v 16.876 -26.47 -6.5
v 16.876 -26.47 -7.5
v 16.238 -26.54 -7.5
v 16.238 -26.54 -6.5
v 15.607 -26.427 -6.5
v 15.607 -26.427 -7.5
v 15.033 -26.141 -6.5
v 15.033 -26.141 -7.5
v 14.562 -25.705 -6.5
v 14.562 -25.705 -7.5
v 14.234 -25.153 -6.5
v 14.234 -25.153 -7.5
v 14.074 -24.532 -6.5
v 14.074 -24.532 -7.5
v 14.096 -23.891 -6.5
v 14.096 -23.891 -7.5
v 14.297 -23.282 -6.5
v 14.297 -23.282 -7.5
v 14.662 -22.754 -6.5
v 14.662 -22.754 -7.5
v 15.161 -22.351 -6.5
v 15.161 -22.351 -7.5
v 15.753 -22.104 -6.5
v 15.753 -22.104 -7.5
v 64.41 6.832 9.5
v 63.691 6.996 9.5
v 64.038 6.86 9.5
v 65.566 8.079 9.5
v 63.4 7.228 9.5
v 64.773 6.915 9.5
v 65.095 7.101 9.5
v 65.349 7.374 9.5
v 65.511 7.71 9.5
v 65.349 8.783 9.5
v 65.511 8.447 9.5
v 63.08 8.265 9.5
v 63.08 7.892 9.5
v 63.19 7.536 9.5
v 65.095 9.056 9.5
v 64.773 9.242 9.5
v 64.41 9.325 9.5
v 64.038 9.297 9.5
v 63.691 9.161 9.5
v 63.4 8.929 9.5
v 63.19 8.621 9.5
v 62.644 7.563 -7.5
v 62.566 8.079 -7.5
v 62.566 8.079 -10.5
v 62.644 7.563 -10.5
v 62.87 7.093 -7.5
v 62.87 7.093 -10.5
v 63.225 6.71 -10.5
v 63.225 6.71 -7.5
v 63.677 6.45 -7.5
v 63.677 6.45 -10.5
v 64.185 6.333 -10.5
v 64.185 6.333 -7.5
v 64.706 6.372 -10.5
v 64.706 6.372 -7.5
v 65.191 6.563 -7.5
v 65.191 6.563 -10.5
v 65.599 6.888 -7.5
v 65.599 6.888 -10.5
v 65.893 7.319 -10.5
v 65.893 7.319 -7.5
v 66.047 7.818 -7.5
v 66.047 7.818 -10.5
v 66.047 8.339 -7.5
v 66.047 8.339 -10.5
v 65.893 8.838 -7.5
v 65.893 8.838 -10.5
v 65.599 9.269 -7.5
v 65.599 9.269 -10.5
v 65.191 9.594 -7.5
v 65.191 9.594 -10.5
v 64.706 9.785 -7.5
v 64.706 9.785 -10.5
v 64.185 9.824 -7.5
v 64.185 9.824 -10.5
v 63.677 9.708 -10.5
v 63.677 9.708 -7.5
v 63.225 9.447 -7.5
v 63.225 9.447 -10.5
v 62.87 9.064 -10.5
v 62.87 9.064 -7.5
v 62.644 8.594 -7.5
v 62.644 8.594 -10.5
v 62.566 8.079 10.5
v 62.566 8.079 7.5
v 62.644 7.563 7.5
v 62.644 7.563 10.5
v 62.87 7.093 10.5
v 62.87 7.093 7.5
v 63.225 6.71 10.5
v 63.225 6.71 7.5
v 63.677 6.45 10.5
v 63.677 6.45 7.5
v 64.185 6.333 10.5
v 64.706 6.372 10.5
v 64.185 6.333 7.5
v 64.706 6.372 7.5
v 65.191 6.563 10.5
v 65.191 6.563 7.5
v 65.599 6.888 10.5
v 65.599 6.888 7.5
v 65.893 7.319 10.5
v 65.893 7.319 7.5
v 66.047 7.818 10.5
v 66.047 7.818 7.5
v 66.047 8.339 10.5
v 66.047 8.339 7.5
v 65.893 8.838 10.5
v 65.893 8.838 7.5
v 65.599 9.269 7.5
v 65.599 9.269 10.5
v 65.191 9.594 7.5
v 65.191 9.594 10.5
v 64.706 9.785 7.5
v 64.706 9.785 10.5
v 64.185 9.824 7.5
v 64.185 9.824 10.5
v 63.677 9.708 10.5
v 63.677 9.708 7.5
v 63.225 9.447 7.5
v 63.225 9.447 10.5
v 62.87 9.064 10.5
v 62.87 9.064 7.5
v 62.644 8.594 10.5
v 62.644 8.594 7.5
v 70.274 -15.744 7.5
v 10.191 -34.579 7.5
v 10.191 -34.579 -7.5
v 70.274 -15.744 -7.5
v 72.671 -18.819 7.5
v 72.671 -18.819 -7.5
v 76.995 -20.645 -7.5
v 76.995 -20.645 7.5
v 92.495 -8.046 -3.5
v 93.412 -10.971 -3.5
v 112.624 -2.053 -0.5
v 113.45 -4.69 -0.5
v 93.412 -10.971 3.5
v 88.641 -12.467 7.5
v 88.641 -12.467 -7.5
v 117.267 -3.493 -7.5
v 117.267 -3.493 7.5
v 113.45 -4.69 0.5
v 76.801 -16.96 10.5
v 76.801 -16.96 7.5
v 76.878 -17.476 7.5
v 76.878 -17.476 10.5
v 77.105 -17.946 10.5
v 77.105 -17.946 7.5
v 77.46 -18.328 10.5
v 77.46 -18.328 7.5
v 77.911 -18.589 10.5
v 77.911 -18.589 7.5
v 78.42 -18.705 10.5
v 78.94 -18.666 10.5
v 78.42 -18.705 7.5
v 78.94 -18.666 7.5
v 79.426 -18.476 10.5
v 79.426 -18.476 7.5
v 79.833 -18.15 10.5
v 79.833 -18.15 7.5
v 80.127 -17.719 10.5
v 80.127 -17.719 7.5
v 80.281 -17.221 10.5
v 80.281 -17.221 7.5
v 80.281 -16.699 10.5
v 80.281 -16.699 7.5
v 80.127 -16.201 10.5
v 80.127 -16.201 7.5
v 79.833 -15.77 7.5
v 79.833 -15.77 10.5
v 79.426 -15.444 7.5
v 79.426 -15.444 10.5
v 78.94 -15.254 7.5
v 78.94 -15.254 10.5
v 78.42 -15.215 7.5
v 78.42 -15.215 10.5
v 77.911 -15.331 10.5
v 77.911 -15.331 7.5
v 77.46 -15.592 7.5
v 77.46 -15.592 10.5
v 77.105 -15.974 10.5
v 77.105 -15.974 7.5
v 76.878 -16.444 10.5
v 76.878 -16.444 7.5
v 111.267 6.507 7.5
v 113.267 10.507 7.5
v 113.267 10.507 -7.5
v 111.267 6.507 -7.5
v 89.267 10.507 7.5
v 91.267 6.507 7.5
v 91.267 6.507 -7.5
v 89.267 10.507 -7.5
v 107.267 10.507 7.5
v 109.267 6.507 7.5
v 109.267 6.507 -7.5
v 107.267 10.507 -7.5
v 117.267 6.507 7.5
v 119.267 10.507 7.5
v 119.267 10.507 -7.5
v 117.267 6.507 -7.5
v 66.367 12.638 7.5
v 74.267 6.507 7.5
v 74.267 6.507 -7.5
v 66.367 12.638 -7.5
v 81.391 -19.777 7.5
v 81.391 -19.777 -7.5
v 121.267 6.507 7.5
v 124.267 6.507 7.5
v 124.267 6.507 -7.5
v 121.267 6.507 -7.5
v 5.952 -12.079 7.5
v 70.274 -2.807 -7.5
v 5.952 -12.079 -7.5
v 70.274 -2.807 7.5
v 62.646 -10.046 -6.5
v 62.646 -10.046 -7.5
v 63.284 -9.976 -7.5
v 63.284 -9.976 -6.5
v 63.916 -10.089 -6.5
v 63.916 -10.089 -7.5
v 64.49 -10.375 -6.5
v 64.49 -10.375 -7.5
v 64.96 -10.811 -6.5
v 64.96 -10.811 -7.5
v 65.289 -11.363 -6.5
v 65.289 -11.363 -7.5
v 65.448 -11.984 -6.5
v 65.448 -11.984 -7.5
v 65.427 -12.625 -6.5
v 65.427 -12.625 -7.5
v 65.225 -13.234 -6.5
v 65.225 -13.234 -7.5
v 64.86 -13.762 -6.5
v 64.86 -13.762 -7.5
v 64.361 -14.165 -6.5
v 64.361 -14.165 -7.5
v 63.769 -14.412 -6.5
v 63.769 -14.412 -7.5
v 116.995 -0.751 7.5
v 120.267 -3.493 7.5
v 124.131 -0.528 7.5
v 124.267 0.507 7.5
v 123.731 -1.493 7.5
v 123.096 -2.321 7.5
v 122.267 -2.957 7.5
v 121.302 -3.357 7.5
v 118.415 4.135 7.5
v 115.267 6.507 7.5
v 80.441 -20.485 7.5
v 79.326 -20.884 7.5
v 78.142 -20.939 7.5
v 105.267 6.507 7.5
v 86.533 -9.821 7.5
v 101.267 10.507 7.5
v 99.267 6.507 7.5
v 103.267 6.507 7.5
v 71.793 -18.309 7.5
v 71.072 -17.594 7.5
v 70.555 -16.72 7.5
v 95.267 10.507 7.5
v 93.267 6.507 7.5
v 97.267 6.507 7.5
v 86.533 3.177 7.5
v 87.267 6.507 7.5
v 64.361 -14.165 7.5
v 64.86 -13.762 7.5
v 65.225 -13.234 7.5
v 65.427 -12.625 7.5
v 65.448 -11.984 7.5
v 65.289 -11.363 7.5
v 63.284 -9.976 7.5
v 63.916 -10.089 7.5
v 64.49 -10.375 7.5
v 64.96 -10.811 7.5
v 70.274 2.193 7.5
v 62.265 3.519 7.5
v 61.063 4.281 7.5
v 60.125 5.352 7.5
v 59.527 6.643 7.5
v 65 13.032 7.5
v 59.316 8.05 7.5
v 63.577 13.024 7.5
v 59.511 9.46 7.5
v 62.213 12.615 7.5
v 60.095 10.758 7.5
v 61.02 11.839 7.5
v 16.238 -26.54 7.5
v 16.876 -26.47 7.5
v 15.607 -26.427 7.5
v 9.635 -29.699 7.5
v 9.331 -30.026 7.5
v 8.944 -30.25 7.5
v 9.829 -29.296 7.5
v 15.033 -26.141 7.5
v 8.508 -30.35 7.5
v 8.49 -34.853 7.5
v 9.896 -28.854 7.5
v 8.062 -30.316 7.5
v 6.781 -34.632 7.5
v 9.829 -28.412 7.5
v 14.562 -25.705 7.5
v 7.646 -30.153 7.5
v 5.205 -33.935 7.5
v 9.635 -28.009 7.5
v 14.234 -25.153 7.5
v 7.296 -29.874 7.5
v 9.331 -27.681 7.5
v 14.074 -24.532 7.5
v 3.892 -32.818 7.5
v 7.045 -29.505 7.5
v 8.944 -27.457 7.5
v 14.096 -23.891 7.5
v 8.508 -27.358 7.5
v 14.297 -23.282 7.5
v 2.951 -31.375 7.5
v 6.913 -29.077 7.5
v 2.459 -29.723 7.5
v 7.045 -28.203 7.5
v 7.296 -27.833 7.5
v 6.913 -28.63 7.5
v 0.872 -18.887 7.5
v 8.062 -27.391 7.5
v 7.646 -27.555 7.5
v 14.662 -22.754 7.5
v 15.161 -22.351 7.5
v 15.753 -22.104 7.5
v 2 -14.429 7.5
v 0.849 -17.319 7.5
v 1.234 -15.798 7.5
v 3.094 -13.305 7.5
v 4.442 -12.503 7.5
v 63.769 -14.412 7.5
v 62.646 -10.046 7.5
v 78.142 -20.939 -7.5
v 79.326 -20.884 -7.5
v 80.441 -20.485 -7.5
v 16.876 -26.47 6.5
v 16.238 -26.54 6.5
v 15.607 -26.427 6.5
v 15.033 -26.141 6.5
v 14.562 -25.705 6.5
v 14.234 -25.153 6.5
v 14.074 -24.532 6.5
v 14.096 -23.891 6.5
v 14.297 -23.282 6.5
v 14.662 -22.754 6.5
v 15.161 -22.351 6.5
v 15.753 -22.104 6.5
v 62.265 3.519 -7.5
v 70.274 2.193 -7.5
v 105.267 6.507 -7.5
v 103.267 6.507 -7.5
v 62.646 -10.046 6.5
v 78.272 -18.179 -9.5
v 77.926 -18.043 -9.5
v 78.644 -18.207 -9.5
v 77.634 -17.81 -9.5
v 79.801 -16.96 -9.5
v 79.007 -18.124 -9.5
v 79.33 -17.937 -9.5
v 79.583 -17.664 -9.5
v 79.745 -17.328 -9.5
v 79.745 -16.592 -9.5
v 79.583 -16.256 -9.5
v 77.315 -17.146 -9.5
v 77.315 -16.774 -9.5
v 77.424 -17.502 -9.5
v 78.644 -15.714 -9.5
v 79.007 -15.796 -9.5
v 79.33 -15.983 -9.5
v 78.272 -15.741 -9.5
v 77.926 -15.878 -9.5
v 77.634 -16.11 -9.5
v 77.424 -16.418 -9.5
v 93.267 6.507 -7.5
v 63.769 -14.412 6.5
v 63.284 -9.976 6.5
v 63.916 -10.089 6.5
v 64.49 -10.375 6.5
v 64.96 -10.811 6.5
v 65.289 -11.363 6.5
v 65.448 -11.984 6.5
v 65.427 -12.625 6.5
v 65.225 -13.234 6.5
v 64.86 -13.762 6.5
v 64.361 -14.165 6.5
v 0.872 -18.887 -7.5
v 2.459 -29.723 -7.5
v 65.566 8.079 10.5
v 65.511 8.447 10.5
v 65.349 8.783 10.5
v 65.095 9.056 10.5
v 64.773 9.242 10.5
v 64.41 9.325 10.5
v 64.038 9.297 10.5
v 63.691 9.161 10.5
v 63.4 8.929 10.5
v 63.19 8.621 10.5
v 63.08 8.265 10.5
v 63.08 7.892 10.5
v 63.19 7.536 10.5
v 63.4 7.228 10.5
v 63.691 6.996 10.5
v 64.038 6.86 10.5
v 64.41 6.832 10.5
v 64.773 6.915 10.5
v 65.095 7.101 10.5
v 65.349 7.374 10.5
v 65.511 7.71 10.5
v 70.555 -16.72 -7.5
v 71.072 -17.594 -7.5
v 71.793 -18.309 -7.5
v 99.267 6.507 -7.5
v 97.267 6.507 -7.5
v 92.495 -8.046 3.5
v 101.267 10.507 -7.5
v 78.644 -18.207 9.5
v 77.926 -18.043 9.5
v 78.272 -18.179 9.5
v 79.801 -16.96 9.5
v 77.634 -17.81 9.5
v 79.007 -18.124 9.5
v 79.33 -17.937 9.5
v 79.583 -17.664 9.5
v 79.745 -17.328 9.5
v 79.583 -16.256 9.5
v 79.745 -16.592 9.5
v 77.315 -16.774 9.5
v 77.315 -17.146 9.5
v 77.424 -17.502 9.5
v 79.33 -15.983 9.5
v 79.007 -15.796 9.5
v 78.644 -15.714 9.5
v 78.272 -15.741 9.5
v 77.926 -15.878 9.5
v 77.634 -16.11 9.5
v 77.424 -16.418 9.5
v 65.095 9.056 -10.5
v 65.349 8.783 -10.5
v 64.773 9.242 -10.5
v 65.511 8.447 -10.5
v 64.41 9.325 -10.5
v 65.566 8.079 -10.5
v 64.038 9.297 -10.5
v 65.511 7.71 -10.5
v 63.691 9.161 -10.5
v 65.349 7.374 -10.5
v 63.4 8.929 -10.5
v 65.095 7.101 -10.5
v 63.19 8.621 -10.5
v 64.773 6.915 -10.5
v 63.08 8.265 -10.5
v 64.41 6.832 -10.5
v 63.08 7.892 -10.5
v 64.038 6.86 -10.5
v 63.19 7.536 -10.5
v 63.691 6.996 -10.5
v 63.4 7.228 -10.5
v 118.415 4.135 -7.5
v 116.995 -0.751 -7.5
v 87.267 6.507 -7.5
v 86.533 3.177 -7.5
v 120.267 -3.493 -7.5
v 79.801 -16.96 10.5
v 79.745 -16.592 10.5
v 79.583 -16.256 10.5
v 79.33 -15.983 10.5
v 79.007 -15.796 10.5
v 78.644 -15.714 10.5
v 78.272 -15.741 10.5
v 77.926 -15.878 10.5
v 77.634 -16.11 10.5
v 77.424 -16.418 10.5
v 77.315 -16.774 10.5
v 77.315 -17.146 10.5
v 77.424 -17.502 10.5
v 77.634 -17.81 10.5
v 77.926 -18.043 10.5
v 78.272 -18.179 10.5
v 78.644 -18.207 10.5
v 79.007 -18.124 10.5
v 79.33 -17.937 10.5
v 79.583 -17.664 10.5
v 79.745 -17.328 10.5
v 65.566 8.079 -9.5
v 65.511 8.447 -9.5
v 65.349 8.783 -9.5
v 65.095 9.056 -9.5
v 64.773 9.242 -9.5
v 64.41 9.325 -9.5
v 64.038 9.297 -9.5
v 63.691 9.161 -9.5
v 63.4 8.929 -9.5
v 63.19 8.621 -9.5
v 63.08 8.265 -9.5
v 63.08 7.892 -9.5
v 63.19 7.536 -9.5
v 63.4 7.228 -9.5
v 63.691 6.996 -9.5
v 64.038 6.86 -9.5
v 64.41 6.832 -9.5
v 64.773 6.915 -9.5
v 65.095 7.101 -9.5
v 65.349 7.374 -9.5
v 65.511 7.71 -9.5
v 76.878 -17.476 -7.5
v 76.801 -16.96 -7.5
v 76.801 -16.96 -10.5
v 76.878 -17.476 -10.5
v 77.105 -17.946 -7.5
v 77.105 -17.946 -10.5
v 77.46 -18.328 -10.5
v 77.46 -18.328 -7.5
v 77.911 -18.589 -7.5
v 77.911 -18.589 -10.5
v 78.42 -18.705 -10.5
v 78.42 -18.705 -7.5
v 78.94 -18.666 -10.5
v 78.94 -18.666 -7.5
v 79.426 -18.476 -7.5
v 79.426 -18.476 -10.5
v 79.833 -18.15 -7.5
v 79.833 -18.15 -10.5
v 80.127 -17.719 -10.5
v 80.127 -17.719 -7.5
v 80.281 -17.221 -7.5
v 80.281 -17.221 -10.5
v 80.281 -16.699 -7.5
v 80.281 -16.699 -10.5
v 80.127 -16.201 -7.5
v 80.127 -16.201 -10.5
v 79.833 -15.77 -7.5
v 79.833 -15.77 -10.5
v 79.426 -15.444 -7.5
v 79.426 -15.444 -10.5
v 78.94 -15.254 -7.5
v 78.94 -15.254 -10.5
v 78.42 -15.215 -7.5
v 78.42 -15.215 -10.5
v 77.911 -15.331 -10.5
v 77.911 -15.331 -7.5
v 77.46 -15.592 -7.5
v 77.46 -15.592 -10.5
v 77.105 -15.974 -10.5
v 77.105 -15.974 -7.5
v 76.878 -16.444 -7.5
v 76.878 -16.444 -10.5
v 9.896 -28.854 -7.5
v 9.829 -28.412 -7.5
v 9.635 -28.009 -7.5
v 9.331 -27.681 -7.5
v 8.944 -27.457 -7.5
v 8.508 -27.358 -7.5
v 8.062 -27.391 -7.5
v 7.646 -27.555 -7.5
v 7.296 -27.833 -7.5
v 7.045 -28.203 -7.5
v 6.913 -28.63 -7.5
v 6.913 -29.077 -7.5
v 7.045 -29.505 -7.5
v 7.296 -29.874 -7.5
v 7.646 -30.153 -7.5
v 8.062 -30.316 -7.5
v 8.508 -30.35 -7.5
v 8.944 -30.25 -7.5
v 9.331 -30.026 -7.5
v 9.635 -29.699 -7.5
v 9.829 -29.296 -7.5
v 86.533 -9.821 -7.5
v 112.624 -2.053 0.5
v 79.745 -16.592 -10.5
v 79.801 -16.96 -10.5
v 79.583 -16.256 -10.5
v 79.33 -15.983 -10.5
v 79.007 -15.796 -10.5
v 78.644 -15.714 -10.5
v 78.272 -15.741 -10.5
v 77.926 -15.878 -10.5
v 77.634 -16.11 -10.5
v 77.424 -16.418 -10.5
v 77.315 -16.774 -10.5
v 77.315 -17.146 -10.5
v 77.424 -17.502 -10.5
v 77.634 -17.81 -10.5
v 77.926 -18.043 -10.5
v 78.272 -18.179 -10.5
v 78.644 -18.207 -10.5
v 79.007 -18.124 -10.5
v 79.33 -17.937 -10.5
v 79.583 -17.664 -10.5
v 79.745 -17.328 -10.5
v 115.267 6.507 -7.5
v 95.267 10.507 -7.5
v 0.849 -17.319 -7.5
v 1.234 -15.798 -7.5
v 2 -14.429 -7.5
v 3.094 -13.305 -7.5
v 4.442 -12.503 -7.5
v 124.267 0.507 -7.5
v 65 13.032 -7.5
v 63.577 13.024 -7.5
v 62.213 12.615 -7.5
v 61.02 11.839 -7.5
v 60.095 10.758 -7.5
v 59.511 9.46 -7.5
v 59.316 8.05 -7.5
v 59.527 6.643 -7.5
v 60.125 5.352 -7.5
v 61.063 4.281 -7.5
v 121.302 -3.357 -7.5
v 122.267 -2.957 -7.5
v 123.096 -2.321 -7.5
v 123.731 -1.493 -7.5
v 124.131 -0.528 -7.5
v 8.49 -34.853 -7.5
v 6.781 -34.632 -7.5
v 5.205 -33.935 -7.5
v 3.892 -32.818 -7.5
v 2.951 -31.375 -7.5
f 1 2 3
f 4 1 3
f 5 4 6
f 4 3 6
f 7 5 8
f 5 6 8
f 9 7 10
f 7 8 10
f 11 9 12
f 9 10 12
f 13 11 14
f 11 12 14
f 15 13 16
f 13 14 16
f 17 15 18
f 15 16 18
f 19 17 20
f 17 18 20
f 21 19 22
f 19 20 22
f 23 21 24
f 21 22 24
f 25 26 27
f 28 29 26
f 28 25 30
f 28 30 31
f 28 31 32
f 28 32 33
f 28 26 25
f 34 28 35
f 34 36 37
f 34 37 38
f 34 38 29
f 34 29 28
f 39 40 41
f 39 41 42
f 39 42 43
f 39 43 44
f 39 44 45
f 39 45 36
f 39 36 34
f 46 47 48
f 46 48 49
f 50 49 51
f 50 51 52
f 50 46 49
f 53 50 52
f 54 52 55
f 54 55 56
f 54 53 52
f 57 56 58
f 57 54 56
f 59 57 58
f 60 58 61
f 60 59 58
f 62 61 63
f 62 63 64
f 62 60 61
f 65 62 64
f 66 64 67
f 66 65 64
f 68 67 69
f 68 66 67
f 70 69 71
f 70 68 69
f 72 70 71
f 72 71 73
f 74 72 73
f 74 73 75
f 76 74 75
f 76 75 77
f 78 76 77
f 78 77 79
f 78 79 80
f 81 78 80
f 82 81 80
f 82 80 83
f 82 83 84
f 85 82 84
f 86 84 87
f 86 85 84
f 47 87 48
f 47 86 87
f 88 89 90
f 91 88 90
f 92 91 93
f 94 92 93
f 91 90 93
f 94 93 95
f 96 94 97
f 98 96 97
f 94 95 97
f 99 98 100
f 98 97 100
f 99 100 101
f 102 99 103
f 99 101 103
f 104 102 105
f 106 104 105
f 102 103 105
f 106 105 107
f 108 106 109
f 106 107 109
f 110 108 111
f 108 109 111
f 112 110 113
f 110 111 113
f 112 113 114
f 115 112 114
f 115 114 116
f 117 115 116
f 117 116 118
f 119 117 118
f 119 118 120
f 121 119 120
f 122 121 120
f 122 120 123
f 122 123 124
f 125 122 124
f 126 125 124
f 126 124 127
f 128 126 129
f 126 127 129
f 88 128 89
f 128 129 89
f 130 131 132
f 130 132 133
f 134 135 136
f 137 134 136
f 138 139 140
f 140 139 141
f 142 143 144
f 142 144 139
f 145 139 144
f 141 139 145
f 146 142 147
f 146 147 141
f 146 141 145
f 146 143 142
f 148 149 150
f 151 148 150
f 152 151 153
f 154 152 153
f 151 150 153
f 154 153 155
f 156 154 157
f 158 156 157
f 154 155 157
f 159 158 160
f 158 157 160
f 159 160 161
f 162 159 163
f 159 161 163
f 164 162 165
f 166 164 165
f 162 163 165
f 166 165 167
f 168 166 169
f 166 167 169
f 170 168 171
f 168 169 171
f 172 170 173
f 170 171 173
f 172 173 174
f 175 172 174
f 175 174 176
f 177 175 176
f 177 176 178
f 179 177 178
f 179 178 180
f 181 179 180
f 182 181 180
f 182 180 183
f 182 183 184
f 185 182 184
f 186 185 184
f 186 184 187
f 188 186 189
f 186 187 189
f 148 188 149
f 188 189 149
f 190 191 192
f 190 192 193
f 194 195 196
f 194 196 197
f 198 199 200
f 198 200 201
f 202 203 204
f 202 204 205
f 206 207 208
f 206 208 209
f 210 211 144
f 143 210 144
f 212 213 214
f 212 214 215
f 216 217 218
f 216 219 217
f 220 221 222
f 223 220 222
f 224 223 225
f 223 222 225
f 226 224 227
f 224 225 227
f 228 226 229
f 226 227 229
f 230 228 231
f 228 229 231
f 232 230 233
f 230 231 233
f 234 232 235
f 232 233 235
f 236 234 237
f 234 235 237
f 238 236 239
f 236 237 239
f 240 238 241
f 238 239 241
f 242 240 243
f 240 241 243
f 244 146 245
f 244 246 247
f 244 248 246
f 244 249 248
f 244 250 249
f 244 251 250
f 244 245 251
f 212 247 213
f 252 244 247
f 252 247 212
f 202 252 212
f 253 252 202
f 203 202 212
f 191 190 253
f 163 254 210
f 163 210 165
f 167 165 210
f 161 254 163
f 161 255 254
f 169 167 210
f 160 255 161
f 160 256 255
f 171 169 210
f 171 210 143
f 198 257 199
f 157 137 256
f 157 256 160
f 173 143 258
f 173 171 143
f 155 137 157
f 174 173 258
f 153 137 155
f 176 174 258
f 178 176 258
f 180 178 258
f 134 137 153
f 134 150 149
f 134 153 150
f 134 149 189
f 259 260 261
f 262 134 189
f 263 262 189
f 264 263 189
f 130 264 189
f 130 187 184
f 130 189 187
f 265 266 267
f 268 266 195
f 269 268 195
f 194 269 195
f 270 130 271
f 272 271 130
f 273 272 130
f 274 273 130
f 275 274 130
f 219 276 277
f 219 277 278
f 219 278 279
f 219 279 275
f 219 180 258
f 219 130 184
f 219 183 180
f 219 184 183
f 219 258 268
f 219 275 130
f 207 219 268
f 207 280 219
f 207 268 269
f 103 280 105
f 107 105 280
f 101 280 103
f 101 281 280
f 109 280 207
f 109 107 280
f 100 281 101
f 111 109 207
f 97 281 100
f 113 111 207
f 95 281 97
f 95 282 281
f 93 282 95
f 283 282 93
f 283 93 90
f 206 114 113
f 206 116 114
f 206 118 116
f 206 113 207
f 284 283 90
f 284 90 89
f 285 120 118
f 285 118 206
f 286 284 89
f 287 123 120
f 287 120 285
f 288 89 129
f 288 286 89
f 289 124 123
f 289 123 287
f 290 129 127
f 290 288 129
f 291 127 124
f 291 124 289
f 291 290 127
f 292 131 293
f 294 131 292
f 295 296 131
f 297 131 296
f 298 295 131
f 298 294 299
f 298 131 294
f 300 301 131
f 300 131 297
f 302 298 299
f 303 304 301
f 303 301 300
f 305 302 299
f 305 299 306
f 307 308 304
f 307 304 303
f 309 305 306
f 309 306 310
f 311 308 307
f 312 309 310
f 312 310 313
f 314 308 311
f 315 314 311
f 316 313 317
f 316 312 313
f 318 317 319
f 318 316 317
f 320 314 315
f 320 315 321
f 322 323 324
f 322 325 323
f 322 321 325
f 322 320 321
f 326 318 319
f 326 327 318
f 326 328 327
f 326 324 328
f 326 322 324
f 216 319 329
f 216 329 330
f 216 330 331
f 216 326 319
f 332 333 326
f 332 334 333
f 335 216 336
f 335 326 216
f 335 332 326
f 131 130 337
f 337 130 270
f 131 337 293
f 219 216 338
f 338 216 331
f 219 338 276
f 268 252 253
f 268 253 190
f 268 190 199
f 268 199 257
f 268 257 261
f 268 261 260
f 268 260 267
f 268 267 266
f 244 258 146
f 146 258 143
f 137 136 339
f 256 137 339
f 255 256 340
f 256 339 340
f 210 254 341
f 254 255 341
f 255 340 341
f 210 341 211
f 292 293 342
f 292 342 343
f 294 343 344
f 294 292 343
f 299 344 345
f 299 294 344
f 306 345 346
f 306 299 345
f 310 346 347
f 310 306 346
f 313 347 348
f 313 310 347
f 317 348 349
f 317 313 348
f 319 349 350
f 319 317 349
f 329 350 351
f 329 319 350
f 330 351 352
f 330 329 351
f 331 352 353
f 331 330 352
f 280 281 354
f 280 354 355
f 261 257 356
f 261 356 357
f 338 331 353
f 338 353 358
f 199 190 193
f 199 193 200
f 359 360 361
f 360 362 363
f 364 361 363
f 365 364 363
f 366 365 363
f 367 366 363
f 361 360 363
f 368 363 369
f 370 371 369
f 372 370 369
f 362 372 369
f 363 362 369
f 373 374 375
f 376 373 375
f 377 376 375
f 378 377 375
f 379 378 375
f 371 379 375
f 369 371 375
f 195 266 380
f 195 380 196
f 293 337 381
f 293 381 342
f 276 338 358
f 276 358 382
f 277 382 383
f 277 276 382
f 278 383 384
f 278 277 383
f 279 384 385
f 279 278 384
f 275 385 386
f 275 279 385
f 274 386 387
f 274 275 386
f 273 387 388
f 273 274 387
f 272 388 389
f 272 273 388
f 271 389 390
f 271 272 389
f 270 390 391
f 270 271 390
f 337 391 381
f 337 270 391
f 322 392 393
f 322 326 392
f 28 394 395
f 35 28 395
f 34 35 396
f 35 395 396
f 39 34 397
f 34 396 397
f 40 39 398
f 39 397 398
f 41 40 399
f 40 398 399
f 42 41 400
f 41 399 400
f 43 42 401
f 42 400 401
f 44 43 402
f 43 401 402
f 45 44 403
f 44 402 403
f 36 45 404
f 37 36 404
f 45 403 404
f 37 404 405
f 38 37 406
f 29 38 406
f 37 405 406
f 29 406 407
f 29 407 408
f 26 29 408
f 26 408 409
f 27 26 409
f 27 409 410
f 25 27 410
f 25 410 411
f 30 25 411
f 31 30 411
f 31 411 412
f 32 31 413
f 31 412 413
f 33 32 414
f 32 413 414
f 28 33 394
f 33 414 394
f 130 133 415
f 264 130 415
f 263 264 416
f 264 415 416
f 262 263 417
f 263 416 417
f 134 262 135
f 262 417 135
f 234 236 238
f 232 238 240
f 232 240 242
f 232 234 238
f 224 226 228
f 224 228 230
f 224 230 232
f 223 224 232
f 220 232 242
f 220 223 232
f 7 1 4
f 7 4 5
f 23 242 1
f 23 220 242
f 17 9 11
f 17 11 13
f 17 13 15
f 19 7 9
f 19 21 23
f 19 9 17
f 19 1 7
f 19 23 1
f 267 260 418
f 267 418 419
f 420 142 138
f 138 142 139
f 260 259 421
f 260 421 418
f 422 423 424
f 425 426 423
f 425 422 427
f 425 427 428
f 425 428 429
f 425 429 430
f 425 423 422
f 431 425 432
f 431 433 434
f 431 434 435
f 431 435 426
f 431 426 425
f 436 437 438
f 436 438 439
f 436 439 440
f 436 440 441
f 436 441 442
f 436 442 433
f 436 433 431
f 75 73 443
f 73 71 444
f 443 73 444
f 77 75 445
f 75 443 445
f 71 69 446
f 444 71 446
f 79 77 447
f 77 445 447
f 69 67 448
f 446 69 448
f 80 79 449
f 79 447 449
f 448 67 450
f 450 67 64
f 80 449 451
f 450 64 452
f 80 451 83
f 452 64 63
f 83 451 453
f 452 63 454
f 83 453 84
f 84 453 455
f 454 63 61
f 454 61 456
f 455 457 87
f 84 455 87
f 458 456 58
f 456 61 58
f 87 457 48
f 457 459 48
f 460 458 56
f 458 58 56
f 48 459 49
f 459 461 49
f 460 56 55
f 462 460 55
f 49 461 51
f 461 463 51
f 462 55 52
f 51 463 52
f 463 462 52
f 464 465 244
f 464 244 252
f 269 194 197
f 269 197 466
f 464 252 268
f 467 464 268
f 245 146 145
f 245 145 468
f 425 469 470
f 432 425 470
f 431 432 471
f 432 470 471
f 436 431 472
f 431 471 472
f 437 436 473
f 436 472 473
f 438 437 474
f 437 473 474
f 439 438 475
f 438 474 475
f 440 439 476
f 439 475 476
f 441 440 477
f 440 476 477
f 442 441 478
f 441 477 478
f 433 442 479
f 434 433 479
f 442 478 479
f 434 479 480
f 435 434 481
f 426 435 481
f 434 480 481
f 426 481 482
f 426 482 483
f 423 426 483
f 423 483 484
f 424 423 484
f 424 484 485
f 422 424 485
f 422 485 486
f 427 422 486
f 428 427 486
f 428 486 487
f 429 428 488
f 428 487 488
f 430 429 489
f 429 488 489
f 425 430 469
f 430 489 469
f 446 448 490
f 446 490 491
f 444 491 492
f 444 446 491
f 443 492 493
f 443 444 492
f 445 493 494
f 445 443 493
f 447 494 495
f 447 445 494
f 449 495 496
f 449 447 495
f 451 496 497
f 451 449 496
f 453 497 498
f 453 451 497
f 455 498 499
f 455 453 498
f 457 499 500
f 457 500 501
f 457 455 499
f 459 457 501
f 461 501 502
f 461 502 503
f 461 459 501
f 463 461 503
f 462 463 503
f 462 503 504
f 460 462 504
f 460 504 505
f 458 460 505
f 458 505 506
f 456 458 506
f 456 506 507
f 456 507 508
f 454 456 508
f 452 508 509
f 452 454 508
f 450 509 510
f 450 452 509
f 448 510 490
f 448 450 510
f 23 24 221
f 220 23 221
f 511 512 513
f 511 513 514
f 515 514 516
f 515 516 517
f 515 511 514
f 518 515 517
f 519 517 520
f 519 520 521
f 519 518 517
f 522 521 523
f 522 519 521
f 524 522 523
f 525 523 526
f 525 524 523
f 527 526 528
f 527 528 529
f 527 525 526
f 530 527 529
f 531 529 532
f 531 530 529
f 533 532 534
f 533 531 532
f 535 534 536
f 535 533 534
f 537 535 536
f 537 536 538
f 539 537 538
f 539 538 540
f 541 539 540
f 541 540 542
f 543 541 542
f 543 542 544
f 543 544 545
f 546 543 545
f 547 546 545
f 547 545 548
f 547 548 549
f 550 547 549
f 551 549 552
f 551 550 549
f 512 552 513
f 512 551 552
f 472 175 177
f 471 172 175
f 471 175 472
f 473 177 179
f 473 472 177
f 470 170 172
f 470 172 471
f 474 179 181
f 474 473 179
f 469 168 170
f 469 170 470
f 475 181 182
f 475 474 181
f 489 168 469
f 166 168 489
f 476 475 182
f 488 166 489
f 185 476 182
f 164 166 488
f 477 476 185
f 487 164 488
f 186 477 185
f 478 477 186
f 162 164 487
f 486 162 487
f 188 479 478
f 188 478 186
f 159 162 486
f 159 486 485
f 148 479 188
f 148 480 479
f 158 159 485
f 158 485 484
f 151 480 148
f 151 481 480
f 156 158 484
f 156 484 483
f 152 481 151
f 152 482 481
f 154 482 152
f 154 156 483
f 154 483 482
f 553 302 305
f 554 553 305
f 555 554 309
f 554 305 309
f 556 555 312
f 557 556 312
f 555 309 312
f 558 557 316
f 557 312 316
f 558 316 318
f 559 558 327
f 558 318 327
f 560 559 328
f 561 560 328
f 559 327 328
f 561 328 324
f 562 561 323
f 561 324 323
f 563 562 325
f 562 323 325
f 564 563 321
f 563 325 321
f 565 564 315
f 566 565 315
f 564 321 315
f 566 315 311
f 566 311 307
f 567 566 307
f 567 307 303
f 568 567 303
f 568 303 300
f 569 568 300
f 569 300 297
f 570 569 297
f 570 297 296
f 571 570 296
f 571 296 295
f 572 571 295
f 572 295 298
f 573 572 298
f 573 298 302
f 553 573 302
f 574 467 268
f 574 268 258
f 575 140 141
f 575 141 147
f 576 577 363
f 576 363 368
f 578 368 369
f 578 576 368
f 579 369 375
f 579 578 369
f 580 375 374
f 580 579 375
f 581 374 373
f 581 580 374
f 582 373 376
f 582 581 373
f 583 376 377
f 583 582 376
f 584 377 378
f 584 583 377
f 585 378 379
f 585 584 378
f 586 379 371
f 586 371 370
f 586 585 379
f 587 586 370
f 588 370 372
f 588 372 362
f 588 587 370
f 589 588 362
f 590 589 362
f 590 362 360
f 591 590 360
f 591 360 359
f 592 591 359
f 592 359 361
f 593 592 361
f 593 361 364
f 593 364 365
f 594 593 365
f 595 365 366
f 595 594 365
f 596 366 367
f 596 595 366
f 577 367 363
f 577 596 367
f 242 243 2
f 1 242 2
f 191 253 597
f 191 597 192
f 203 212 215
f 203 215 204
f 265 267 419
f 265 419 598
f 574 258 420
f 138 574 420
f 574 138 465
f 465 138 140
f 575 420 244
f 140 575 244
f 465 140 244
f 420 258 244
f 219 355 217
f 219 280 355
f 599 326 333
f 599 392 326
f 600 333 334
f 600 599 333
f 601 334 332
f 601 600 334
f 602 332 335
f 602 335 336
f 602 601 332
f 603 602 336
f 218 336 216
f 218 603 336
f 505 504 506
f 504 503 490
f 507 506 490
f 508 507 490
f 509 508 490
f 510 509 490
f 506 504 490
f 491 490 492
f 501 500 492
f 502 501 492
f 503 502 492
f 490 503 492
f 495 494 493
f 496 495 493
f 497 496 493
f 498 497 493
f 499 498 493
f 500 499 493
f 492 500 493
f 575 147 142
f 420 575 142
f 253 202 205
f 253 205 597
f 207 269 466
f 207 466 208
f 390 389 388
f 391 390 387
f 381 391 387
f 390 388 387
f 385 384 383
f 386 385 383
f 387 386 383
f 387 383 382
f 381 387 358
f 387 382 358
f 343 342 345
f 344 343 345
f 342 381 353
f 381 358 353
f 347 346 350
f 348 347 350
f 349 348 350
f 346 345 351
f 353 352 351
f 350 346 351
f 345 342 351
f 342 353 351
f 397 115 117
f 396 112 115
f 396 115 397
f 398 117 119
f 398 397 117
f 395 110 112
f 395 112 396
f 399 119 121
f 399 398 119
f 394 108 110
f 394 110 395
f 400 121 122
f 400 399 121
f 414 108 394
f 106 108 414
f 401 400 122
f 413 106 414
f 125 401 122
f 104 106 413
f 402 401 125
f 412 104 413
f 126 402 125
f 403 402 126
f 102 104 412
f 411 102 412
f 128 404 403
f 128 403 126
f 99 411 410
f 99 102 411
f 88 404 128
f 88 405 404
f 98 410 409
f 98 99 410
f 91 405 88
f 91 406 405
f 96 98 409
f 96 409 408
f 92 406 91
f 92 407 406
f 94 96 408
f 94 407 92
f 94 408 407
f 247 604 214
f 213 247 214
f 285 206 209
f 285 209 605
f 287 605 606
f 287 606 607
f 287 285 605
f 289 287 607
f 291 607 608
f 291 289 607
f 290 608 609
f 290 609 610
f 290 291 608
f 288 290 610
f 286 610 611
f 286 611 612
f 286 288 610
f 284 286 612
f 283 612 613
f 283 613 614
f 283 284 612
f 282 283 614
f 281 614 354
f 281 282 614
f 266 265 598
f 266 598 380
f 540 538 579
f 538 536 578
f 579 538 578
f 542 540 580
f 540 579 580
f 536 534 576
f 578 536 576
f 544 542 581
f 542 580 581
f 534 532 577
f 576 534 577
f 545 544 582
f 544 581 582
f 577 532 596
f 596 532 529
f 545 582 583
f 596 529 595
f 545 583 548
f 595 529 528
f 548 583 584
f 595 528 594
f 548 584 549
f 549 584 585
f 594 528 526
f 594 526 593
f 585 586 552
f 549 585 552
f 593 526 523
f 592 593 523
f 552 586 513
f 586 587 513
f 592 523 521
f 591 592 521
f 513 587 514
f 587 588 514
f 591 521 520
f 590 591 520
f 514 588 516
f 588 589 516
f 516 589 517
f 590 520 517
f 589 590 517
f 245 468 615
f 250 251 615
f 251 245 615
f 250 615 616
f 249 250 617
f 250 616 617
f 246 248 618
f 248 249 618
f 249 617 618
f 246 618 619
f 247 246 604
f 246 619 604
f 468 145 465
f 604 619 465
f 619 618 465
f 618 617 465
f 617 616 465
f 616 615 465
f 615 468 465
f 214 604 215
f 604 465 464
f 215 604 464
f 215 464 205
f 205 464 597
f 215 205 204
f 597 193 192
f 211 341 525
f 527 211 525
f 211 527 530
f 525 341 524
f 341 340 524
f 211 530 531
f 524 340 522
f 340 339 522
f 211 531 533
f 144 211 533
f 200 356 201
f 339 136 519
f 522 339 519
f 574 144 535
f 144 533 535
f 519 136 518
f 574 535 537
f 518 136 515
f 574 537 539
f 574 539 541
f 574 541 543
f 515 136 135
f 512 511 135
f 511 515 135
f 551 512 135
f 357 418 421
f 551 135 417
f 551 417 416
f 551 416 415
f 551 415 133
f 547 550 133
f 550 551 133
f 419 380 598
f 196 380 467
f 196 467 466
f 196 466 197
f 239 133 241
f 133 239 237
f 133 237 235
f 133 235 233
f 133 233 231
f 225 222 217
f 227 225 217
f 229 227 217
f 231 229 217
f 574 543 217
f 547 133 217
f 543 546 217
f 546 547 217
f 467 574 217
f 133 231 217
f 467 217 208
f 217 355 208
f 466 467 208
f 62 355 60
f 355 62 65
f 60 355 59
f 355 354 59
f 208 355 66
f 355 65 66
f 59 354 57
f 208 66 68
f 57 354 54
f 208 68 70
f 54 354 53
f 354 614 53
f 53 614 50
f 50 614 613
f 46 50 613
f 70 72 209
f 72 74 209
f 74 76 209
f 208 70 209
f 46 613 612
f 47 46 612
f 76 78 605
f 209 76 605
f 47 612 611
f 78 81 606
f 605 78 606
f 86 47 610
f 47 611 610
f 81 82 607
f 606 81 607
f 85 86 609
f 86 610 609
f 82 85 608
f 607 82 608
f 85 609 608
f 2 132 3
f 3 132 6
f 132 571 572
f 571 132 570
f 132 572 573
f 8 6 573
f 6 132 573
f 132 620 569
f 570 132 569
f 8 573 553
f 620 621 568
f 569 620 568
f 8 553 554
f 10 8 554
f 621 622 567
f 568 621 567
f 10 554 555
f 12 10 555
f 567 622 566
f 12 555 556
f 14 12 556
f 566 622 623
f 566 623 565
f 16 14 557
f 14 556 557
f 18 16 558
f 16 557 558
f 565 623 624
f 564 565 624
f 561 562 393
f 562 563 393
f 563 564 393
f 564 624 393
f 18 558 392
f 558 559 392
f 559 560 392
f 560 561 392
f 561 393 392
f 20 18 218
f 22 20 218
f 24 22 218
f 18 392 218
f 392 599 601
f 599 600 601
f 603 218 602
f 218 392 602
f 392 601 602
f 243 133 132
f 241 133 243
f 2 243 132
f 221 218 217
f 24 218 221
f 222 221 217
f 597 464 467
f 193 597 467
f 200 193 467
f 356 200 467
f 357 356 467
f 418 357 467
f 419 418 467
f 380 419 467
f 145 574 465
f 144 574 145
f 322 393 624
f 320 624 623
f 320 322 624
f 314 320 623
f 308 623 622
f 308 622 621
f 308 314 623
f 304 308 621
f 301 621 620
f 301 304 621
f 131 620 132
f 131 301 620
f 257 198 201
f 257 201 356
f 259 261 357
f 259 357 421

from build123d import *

# Parameters (mm, degrees)
BOSS_EXTRUDE1_DEPTH = 7.5
FILLET1_R           = 6
FILLET2_R           = 4
BOSS_EXTRUDE2_DEPTH = 15
LPATTERN1_COUNT     = 6
LPATTERN1_PITCH     = 6
CUT_EXTRUDE1_DEPTH  = 26
CUT_EXTRUDE2_DEPTH  = 5
SKETCH5_R           = 1.5
CUT_EXTRUDE3_DEPTH  = 130.931165931
SKETCH6_R           = 1.75
BOSS_EXTRUDE3_DEPTH = 3
SKETCH7_R           = 1.25
CUT_EXTRUDE4_DEPTH  = 1
SKETCH8_R           = 1.25
CUT_EXTRUDE5_DEPTH  = 1
CUT_EXTRUDE6_DEPTH  = 1


with BuildPart() as part:
    # Sketch1 → Boss-Extrude1 (new, symmetric)
    with BuildSketch(Plane(origin=(0, 0, 0), x_dir=(0, 1, 0), z_dir=(0, 0, 1))):
        with BuildLine():
            Line((-12.93657624, 0), (-36.683093305, -3.478926169))
            Line((-36.683093305, -3.478926169), (-15.74375395, -70.273716889))
            Line((-15.74375395, -70.273716889), (-17.80717771, -70.273716889))
            Line((-17.80717771, -70.273716889), (-21.696997284, -79.486170616))
            Line((-21.696997284, -79.486170616), (-12.467013439, -88.640808687))
            Line((-12.467013439, -88.640808687), (-3.493010858, -117.267147567))
            Line((-3.493010858, -117.267147567), (-3.493010858, -124.267147567))
            Line((-3.493010858, -124.267147567), (6.506989142, -124.267147567))
            Line((6.506989142, -124.267147567), (6.506989142, -74.267147567))
            Line((6.506989142, -74.267147567), (12.638392495, -66.367407513))
            ThreePointArc((12.638392495, -66.367407513), (10.129821893, -59.756274968), (3.518689347, -62.26484557))
            Line((3.518689347, -62.26484557), (2.19282229, -70.273716889))
            Line((2.19282229, -70.273716889), (-2.80717771, -70.273716889))
            Line((-2.80717771, -70.273716889), (-12.93657624, 0))
        make_face()
    extrude(amount=BOSS_EXTRUDE1_DEPTH, both=True)

    # Fillet1
    fillet1_edges = [part.edges().sort_by_distance(p)[0] for p in [
        (3.478926169, -36.683093305, 0),
        (0, -12.93657624, 0),
    ]]
    fillet(fillet1_edges, radius=FILLET1_R)

    # Fillet2
    # the kernel refuses this fillet: 4 mm, written as the material it takes off along each edge
    with BuildSketch(Plane(origin=(124.267147567, -3.493010858, -17.5), x_dir=(0, 1, 0), z_dir=(0, 0, 1))) as fillet2_piece_1:
        with BuildLine():
            CenterArc((FILLET2_R, FILLET2_R), FILLET2_R, 180, 90)
            Line((0, FILLET2_R), (-FILLET2_R * 0.02, FILLET2_R))
            Line((-FILLET2_R * 0.02, FILLET2_R), (-FILLET2_R * 0.02, -FILLET2_R * 0.02))
            Line((-FILLET2_R * 0.02, -FILLET2_R * 0.02), (FILLET2_R, -FILLET2_R * 0.02))
            Line((FILLET2_R, -FILLET2_R * 0.02), (FILLET2_R, 0))
        make_face()
    extrude(amount=35, mode=Mode.SUBTRACT)
    with BuildSketch(Plane(origin=(70.273716889, -17.80717771, -14.005853421), x_dir=(0, 1, 0), z_dir=(0, 0, 1))) as fillet2_piece_2_section:
        with BuildLine():
            CenterArc((2.672717651, -3.953322774), FILLET2_R, 98.761599305, 58.347232051)
            Line((-1.012263839, -2.397394944), (-1.085963469, -2.366276387))
            Line((-1.085963469, -2.366276387), (-0.07369963, 0.031118557))
            Line((-0.07369963, 0.031118557), (0, 0.08))
            ThreePointArc((0, 0.08), (1.03171188, 0.08), (2.051237882, 0.079066455))
            Line((2.051237882, 0.079066455), (2.06342376, 0))
        make_face()
    fillet2_piece_2 = extrude(amount=28.011706842, mode=Mode.PRIVATE)
    fillet2_piece_2 = split(fillet2_piece_2, bisect_by=Plane(origin=(70.257081216, -15.748969027, 0), z_dir=(0.2991334193615799, -0.954211296003694, 0)), keep=Keep.TOP, mode=Mode.PRIVATE)
    add(fillet2_piece_2, mode=Mode.SUBTRACT)
    with BuildSketch(Plane(origin=(79.486170616, -21.696997284, -14.26109301), x_dir=(-0.9212453727262618, 0.3889819574613337, 0), z_dir=(0, 0, 1))) as fillet2_piece_3:
        with BuildLine():
            CenterArc((FILLET2_R * 0.676109301023, -FILLET2_R), FILLET2_R, 90, 68.125982867)
            Line((-FILLET2_R * 0.251896002422, -FILLET2_R * 0.627433017057), (-FILLET2_R * 0.270456108491, -FILLET2_R * 0.619981677398))
            Line((-FILLET2_R * 0.270456108491, -FILLET2_R * 0.619981677398), (-FILLET2_R * 0.0135221860205, FILLET2_R * 0.02))
            Line((-FILLET2_R * 0.0135221860205, FILLET2_R * 0.02), (FILLET2_R * 0.676109301023, FILLET2_R * 0.02))
            Line((FILLET2_R * 0.676109301023, FILLET2_R * 0.02), (FILLET2_R * 0.676109301023, 0))
        make_face()
    extrude(amount=28.52218602, mode=Mode.SUBTRACT)

    # Sketch2 → Boss-Extrude2 (add)
    with BuildSketch(Plane.XY.offset(7.5)):
        Polygon((119.267147567, 6.506989142), (121.267147567, 6.506989142), (119.267147567, 10.506989142), align=None)
        Polygon((117.267147567, 6.506989142), (119.267147567, 6.506989142), (119.267147567, 10.506989142), align=None)
    boss_extrude2 = extrude(amount=-BOSS_EXTRUDE2_DEPTH)

    # LPattern1: Boss-Extrude2 ×6
    with Locations(*[(-i * LPATTERN1_PITCH, 0, 0) for i in range(1, LPATTERN1_COUNT)]):
        add(boss_extrude2)

    # Sketch3 → Cut-Extrude1 (cut)
    with BuildSketch(Plane.XY.offset(7.5)):
        Polygon((118.41479062, 4.13462657), (86.532799982, 3.176685284), (86.532799982, -9.820815038), (116.995150337, -0.75112261), align=None)
    extrude(amount=-CUT_EXTRUDE1_DEPTH, mode=Mode.SUBTRACT)

    # Sketch4 → Cut-Extrude2 (cut)
    with BuildSketch(Plane(origin=(11.490191231, -36.652776175, 0), x_dir=(0.954211296003694, 0.2991334193615799, 0), z_dir=(0.29913341936157983, -0.9542112960036939, 0))):
        Polygon((85.852760577, 3.5), (85.852760577, -3.5), (106.852760577, -0.5), (106.852760577, 0.5), align=None)
    extrude(amount=-CUT_EXTRUDE2_DEPTH, mode=Mode.SUBTRACT)

    # Sketch5 → Cut-Extrude3 (cut, through all)
    with BuildSketch(Plane.XY.offset(7.5)):
        with Locations((8.395954367, -28.853750382)):
            Circle(SKETCH5_R)
    extrude(amount=-CUT_EXTRUDE3_DEPTH, mode=Mode.SUBTRACT)

    # Sketch6 → Boss-Extrude3 (add)
    with BuildSketch(Plane.XY.offset(7.5)):
        with Locations(Location((78.550648186, -16.960038516, 0), (0, 0, 180))):
            Circle(SKETCH6_R)
        with Locations(Location((64.316126541, 8.078540921, 0), (0, 0, 180))):
            Circle(SKETCH6_R)
    boss_extrude3 = extrude(amount=BOSS_EXTRUDE3_DEPTH)

    # Sketch7 → Cut-Extrude4 (cut)
    with BuildSketch(Plane.XY.offset(10.5)):
        with Locations((78.550648186, -16.960038516)):
            Circle(SKETCH7_R)
    cut_extrude4 = extrude(amount=-CUT_EXTRUDE4_DEPTH, mode=Mode.SUBTRACT)

    # Sketch8 → Cut-Extrude5 (cut)
    with BuildSketch(Plane.XY.offset(10.5)):
        with Locations((64.316126541, 8.078540921)):
            Circle(SKETCH8_R)
    cut_extrude5 = extrude(amount=-CUT_EXTRUDE5_DEPTH, mode=Mode.SUBTRACT)

    # Sketch9 → Cut-Extrude6 (cut)
    with BuildSketch(Plane.XY.offset(7.5)):
        with BuildLine():
            Line((15.753388713, -22.103953925), (62.646298586, -10.0457771))
            ThreePointArc((62.646298586, -10.0457771), (65.390728962, -11.667485959), (63.769020103, -14.411916335))
            Line((63.769020103, -14.411916335), (16.87611023, -26.470093159))
            ThreePointArc((16.87611023, -26.470093159), (14.131679854, -24.848384301), (15.753388713, -22.103953925))
        make_face()
    cut_extrude6 = extrude(amount=-CUT_EXTRUDE6_DEPTH, mode=Mode.SUBTRACT)

    # Mirror1: Boss-Extrude3, Cut-Extrude4, Cut-Extrude5, Cut-Extrude6 across plane
    add(boss_extrude3.mirror(Plane.XY))
    add(cut_extrude4.mirror(Plane.XY), mode=Mode.SUBTRACT)
    add(cut_extrude5.mirror(Plane.XY), mode=Mode.SUBTRACT)
    add(cut_extrude6.mirror(Plane.XY), mode=Mode.SUBTRACT)


solid = part.part
